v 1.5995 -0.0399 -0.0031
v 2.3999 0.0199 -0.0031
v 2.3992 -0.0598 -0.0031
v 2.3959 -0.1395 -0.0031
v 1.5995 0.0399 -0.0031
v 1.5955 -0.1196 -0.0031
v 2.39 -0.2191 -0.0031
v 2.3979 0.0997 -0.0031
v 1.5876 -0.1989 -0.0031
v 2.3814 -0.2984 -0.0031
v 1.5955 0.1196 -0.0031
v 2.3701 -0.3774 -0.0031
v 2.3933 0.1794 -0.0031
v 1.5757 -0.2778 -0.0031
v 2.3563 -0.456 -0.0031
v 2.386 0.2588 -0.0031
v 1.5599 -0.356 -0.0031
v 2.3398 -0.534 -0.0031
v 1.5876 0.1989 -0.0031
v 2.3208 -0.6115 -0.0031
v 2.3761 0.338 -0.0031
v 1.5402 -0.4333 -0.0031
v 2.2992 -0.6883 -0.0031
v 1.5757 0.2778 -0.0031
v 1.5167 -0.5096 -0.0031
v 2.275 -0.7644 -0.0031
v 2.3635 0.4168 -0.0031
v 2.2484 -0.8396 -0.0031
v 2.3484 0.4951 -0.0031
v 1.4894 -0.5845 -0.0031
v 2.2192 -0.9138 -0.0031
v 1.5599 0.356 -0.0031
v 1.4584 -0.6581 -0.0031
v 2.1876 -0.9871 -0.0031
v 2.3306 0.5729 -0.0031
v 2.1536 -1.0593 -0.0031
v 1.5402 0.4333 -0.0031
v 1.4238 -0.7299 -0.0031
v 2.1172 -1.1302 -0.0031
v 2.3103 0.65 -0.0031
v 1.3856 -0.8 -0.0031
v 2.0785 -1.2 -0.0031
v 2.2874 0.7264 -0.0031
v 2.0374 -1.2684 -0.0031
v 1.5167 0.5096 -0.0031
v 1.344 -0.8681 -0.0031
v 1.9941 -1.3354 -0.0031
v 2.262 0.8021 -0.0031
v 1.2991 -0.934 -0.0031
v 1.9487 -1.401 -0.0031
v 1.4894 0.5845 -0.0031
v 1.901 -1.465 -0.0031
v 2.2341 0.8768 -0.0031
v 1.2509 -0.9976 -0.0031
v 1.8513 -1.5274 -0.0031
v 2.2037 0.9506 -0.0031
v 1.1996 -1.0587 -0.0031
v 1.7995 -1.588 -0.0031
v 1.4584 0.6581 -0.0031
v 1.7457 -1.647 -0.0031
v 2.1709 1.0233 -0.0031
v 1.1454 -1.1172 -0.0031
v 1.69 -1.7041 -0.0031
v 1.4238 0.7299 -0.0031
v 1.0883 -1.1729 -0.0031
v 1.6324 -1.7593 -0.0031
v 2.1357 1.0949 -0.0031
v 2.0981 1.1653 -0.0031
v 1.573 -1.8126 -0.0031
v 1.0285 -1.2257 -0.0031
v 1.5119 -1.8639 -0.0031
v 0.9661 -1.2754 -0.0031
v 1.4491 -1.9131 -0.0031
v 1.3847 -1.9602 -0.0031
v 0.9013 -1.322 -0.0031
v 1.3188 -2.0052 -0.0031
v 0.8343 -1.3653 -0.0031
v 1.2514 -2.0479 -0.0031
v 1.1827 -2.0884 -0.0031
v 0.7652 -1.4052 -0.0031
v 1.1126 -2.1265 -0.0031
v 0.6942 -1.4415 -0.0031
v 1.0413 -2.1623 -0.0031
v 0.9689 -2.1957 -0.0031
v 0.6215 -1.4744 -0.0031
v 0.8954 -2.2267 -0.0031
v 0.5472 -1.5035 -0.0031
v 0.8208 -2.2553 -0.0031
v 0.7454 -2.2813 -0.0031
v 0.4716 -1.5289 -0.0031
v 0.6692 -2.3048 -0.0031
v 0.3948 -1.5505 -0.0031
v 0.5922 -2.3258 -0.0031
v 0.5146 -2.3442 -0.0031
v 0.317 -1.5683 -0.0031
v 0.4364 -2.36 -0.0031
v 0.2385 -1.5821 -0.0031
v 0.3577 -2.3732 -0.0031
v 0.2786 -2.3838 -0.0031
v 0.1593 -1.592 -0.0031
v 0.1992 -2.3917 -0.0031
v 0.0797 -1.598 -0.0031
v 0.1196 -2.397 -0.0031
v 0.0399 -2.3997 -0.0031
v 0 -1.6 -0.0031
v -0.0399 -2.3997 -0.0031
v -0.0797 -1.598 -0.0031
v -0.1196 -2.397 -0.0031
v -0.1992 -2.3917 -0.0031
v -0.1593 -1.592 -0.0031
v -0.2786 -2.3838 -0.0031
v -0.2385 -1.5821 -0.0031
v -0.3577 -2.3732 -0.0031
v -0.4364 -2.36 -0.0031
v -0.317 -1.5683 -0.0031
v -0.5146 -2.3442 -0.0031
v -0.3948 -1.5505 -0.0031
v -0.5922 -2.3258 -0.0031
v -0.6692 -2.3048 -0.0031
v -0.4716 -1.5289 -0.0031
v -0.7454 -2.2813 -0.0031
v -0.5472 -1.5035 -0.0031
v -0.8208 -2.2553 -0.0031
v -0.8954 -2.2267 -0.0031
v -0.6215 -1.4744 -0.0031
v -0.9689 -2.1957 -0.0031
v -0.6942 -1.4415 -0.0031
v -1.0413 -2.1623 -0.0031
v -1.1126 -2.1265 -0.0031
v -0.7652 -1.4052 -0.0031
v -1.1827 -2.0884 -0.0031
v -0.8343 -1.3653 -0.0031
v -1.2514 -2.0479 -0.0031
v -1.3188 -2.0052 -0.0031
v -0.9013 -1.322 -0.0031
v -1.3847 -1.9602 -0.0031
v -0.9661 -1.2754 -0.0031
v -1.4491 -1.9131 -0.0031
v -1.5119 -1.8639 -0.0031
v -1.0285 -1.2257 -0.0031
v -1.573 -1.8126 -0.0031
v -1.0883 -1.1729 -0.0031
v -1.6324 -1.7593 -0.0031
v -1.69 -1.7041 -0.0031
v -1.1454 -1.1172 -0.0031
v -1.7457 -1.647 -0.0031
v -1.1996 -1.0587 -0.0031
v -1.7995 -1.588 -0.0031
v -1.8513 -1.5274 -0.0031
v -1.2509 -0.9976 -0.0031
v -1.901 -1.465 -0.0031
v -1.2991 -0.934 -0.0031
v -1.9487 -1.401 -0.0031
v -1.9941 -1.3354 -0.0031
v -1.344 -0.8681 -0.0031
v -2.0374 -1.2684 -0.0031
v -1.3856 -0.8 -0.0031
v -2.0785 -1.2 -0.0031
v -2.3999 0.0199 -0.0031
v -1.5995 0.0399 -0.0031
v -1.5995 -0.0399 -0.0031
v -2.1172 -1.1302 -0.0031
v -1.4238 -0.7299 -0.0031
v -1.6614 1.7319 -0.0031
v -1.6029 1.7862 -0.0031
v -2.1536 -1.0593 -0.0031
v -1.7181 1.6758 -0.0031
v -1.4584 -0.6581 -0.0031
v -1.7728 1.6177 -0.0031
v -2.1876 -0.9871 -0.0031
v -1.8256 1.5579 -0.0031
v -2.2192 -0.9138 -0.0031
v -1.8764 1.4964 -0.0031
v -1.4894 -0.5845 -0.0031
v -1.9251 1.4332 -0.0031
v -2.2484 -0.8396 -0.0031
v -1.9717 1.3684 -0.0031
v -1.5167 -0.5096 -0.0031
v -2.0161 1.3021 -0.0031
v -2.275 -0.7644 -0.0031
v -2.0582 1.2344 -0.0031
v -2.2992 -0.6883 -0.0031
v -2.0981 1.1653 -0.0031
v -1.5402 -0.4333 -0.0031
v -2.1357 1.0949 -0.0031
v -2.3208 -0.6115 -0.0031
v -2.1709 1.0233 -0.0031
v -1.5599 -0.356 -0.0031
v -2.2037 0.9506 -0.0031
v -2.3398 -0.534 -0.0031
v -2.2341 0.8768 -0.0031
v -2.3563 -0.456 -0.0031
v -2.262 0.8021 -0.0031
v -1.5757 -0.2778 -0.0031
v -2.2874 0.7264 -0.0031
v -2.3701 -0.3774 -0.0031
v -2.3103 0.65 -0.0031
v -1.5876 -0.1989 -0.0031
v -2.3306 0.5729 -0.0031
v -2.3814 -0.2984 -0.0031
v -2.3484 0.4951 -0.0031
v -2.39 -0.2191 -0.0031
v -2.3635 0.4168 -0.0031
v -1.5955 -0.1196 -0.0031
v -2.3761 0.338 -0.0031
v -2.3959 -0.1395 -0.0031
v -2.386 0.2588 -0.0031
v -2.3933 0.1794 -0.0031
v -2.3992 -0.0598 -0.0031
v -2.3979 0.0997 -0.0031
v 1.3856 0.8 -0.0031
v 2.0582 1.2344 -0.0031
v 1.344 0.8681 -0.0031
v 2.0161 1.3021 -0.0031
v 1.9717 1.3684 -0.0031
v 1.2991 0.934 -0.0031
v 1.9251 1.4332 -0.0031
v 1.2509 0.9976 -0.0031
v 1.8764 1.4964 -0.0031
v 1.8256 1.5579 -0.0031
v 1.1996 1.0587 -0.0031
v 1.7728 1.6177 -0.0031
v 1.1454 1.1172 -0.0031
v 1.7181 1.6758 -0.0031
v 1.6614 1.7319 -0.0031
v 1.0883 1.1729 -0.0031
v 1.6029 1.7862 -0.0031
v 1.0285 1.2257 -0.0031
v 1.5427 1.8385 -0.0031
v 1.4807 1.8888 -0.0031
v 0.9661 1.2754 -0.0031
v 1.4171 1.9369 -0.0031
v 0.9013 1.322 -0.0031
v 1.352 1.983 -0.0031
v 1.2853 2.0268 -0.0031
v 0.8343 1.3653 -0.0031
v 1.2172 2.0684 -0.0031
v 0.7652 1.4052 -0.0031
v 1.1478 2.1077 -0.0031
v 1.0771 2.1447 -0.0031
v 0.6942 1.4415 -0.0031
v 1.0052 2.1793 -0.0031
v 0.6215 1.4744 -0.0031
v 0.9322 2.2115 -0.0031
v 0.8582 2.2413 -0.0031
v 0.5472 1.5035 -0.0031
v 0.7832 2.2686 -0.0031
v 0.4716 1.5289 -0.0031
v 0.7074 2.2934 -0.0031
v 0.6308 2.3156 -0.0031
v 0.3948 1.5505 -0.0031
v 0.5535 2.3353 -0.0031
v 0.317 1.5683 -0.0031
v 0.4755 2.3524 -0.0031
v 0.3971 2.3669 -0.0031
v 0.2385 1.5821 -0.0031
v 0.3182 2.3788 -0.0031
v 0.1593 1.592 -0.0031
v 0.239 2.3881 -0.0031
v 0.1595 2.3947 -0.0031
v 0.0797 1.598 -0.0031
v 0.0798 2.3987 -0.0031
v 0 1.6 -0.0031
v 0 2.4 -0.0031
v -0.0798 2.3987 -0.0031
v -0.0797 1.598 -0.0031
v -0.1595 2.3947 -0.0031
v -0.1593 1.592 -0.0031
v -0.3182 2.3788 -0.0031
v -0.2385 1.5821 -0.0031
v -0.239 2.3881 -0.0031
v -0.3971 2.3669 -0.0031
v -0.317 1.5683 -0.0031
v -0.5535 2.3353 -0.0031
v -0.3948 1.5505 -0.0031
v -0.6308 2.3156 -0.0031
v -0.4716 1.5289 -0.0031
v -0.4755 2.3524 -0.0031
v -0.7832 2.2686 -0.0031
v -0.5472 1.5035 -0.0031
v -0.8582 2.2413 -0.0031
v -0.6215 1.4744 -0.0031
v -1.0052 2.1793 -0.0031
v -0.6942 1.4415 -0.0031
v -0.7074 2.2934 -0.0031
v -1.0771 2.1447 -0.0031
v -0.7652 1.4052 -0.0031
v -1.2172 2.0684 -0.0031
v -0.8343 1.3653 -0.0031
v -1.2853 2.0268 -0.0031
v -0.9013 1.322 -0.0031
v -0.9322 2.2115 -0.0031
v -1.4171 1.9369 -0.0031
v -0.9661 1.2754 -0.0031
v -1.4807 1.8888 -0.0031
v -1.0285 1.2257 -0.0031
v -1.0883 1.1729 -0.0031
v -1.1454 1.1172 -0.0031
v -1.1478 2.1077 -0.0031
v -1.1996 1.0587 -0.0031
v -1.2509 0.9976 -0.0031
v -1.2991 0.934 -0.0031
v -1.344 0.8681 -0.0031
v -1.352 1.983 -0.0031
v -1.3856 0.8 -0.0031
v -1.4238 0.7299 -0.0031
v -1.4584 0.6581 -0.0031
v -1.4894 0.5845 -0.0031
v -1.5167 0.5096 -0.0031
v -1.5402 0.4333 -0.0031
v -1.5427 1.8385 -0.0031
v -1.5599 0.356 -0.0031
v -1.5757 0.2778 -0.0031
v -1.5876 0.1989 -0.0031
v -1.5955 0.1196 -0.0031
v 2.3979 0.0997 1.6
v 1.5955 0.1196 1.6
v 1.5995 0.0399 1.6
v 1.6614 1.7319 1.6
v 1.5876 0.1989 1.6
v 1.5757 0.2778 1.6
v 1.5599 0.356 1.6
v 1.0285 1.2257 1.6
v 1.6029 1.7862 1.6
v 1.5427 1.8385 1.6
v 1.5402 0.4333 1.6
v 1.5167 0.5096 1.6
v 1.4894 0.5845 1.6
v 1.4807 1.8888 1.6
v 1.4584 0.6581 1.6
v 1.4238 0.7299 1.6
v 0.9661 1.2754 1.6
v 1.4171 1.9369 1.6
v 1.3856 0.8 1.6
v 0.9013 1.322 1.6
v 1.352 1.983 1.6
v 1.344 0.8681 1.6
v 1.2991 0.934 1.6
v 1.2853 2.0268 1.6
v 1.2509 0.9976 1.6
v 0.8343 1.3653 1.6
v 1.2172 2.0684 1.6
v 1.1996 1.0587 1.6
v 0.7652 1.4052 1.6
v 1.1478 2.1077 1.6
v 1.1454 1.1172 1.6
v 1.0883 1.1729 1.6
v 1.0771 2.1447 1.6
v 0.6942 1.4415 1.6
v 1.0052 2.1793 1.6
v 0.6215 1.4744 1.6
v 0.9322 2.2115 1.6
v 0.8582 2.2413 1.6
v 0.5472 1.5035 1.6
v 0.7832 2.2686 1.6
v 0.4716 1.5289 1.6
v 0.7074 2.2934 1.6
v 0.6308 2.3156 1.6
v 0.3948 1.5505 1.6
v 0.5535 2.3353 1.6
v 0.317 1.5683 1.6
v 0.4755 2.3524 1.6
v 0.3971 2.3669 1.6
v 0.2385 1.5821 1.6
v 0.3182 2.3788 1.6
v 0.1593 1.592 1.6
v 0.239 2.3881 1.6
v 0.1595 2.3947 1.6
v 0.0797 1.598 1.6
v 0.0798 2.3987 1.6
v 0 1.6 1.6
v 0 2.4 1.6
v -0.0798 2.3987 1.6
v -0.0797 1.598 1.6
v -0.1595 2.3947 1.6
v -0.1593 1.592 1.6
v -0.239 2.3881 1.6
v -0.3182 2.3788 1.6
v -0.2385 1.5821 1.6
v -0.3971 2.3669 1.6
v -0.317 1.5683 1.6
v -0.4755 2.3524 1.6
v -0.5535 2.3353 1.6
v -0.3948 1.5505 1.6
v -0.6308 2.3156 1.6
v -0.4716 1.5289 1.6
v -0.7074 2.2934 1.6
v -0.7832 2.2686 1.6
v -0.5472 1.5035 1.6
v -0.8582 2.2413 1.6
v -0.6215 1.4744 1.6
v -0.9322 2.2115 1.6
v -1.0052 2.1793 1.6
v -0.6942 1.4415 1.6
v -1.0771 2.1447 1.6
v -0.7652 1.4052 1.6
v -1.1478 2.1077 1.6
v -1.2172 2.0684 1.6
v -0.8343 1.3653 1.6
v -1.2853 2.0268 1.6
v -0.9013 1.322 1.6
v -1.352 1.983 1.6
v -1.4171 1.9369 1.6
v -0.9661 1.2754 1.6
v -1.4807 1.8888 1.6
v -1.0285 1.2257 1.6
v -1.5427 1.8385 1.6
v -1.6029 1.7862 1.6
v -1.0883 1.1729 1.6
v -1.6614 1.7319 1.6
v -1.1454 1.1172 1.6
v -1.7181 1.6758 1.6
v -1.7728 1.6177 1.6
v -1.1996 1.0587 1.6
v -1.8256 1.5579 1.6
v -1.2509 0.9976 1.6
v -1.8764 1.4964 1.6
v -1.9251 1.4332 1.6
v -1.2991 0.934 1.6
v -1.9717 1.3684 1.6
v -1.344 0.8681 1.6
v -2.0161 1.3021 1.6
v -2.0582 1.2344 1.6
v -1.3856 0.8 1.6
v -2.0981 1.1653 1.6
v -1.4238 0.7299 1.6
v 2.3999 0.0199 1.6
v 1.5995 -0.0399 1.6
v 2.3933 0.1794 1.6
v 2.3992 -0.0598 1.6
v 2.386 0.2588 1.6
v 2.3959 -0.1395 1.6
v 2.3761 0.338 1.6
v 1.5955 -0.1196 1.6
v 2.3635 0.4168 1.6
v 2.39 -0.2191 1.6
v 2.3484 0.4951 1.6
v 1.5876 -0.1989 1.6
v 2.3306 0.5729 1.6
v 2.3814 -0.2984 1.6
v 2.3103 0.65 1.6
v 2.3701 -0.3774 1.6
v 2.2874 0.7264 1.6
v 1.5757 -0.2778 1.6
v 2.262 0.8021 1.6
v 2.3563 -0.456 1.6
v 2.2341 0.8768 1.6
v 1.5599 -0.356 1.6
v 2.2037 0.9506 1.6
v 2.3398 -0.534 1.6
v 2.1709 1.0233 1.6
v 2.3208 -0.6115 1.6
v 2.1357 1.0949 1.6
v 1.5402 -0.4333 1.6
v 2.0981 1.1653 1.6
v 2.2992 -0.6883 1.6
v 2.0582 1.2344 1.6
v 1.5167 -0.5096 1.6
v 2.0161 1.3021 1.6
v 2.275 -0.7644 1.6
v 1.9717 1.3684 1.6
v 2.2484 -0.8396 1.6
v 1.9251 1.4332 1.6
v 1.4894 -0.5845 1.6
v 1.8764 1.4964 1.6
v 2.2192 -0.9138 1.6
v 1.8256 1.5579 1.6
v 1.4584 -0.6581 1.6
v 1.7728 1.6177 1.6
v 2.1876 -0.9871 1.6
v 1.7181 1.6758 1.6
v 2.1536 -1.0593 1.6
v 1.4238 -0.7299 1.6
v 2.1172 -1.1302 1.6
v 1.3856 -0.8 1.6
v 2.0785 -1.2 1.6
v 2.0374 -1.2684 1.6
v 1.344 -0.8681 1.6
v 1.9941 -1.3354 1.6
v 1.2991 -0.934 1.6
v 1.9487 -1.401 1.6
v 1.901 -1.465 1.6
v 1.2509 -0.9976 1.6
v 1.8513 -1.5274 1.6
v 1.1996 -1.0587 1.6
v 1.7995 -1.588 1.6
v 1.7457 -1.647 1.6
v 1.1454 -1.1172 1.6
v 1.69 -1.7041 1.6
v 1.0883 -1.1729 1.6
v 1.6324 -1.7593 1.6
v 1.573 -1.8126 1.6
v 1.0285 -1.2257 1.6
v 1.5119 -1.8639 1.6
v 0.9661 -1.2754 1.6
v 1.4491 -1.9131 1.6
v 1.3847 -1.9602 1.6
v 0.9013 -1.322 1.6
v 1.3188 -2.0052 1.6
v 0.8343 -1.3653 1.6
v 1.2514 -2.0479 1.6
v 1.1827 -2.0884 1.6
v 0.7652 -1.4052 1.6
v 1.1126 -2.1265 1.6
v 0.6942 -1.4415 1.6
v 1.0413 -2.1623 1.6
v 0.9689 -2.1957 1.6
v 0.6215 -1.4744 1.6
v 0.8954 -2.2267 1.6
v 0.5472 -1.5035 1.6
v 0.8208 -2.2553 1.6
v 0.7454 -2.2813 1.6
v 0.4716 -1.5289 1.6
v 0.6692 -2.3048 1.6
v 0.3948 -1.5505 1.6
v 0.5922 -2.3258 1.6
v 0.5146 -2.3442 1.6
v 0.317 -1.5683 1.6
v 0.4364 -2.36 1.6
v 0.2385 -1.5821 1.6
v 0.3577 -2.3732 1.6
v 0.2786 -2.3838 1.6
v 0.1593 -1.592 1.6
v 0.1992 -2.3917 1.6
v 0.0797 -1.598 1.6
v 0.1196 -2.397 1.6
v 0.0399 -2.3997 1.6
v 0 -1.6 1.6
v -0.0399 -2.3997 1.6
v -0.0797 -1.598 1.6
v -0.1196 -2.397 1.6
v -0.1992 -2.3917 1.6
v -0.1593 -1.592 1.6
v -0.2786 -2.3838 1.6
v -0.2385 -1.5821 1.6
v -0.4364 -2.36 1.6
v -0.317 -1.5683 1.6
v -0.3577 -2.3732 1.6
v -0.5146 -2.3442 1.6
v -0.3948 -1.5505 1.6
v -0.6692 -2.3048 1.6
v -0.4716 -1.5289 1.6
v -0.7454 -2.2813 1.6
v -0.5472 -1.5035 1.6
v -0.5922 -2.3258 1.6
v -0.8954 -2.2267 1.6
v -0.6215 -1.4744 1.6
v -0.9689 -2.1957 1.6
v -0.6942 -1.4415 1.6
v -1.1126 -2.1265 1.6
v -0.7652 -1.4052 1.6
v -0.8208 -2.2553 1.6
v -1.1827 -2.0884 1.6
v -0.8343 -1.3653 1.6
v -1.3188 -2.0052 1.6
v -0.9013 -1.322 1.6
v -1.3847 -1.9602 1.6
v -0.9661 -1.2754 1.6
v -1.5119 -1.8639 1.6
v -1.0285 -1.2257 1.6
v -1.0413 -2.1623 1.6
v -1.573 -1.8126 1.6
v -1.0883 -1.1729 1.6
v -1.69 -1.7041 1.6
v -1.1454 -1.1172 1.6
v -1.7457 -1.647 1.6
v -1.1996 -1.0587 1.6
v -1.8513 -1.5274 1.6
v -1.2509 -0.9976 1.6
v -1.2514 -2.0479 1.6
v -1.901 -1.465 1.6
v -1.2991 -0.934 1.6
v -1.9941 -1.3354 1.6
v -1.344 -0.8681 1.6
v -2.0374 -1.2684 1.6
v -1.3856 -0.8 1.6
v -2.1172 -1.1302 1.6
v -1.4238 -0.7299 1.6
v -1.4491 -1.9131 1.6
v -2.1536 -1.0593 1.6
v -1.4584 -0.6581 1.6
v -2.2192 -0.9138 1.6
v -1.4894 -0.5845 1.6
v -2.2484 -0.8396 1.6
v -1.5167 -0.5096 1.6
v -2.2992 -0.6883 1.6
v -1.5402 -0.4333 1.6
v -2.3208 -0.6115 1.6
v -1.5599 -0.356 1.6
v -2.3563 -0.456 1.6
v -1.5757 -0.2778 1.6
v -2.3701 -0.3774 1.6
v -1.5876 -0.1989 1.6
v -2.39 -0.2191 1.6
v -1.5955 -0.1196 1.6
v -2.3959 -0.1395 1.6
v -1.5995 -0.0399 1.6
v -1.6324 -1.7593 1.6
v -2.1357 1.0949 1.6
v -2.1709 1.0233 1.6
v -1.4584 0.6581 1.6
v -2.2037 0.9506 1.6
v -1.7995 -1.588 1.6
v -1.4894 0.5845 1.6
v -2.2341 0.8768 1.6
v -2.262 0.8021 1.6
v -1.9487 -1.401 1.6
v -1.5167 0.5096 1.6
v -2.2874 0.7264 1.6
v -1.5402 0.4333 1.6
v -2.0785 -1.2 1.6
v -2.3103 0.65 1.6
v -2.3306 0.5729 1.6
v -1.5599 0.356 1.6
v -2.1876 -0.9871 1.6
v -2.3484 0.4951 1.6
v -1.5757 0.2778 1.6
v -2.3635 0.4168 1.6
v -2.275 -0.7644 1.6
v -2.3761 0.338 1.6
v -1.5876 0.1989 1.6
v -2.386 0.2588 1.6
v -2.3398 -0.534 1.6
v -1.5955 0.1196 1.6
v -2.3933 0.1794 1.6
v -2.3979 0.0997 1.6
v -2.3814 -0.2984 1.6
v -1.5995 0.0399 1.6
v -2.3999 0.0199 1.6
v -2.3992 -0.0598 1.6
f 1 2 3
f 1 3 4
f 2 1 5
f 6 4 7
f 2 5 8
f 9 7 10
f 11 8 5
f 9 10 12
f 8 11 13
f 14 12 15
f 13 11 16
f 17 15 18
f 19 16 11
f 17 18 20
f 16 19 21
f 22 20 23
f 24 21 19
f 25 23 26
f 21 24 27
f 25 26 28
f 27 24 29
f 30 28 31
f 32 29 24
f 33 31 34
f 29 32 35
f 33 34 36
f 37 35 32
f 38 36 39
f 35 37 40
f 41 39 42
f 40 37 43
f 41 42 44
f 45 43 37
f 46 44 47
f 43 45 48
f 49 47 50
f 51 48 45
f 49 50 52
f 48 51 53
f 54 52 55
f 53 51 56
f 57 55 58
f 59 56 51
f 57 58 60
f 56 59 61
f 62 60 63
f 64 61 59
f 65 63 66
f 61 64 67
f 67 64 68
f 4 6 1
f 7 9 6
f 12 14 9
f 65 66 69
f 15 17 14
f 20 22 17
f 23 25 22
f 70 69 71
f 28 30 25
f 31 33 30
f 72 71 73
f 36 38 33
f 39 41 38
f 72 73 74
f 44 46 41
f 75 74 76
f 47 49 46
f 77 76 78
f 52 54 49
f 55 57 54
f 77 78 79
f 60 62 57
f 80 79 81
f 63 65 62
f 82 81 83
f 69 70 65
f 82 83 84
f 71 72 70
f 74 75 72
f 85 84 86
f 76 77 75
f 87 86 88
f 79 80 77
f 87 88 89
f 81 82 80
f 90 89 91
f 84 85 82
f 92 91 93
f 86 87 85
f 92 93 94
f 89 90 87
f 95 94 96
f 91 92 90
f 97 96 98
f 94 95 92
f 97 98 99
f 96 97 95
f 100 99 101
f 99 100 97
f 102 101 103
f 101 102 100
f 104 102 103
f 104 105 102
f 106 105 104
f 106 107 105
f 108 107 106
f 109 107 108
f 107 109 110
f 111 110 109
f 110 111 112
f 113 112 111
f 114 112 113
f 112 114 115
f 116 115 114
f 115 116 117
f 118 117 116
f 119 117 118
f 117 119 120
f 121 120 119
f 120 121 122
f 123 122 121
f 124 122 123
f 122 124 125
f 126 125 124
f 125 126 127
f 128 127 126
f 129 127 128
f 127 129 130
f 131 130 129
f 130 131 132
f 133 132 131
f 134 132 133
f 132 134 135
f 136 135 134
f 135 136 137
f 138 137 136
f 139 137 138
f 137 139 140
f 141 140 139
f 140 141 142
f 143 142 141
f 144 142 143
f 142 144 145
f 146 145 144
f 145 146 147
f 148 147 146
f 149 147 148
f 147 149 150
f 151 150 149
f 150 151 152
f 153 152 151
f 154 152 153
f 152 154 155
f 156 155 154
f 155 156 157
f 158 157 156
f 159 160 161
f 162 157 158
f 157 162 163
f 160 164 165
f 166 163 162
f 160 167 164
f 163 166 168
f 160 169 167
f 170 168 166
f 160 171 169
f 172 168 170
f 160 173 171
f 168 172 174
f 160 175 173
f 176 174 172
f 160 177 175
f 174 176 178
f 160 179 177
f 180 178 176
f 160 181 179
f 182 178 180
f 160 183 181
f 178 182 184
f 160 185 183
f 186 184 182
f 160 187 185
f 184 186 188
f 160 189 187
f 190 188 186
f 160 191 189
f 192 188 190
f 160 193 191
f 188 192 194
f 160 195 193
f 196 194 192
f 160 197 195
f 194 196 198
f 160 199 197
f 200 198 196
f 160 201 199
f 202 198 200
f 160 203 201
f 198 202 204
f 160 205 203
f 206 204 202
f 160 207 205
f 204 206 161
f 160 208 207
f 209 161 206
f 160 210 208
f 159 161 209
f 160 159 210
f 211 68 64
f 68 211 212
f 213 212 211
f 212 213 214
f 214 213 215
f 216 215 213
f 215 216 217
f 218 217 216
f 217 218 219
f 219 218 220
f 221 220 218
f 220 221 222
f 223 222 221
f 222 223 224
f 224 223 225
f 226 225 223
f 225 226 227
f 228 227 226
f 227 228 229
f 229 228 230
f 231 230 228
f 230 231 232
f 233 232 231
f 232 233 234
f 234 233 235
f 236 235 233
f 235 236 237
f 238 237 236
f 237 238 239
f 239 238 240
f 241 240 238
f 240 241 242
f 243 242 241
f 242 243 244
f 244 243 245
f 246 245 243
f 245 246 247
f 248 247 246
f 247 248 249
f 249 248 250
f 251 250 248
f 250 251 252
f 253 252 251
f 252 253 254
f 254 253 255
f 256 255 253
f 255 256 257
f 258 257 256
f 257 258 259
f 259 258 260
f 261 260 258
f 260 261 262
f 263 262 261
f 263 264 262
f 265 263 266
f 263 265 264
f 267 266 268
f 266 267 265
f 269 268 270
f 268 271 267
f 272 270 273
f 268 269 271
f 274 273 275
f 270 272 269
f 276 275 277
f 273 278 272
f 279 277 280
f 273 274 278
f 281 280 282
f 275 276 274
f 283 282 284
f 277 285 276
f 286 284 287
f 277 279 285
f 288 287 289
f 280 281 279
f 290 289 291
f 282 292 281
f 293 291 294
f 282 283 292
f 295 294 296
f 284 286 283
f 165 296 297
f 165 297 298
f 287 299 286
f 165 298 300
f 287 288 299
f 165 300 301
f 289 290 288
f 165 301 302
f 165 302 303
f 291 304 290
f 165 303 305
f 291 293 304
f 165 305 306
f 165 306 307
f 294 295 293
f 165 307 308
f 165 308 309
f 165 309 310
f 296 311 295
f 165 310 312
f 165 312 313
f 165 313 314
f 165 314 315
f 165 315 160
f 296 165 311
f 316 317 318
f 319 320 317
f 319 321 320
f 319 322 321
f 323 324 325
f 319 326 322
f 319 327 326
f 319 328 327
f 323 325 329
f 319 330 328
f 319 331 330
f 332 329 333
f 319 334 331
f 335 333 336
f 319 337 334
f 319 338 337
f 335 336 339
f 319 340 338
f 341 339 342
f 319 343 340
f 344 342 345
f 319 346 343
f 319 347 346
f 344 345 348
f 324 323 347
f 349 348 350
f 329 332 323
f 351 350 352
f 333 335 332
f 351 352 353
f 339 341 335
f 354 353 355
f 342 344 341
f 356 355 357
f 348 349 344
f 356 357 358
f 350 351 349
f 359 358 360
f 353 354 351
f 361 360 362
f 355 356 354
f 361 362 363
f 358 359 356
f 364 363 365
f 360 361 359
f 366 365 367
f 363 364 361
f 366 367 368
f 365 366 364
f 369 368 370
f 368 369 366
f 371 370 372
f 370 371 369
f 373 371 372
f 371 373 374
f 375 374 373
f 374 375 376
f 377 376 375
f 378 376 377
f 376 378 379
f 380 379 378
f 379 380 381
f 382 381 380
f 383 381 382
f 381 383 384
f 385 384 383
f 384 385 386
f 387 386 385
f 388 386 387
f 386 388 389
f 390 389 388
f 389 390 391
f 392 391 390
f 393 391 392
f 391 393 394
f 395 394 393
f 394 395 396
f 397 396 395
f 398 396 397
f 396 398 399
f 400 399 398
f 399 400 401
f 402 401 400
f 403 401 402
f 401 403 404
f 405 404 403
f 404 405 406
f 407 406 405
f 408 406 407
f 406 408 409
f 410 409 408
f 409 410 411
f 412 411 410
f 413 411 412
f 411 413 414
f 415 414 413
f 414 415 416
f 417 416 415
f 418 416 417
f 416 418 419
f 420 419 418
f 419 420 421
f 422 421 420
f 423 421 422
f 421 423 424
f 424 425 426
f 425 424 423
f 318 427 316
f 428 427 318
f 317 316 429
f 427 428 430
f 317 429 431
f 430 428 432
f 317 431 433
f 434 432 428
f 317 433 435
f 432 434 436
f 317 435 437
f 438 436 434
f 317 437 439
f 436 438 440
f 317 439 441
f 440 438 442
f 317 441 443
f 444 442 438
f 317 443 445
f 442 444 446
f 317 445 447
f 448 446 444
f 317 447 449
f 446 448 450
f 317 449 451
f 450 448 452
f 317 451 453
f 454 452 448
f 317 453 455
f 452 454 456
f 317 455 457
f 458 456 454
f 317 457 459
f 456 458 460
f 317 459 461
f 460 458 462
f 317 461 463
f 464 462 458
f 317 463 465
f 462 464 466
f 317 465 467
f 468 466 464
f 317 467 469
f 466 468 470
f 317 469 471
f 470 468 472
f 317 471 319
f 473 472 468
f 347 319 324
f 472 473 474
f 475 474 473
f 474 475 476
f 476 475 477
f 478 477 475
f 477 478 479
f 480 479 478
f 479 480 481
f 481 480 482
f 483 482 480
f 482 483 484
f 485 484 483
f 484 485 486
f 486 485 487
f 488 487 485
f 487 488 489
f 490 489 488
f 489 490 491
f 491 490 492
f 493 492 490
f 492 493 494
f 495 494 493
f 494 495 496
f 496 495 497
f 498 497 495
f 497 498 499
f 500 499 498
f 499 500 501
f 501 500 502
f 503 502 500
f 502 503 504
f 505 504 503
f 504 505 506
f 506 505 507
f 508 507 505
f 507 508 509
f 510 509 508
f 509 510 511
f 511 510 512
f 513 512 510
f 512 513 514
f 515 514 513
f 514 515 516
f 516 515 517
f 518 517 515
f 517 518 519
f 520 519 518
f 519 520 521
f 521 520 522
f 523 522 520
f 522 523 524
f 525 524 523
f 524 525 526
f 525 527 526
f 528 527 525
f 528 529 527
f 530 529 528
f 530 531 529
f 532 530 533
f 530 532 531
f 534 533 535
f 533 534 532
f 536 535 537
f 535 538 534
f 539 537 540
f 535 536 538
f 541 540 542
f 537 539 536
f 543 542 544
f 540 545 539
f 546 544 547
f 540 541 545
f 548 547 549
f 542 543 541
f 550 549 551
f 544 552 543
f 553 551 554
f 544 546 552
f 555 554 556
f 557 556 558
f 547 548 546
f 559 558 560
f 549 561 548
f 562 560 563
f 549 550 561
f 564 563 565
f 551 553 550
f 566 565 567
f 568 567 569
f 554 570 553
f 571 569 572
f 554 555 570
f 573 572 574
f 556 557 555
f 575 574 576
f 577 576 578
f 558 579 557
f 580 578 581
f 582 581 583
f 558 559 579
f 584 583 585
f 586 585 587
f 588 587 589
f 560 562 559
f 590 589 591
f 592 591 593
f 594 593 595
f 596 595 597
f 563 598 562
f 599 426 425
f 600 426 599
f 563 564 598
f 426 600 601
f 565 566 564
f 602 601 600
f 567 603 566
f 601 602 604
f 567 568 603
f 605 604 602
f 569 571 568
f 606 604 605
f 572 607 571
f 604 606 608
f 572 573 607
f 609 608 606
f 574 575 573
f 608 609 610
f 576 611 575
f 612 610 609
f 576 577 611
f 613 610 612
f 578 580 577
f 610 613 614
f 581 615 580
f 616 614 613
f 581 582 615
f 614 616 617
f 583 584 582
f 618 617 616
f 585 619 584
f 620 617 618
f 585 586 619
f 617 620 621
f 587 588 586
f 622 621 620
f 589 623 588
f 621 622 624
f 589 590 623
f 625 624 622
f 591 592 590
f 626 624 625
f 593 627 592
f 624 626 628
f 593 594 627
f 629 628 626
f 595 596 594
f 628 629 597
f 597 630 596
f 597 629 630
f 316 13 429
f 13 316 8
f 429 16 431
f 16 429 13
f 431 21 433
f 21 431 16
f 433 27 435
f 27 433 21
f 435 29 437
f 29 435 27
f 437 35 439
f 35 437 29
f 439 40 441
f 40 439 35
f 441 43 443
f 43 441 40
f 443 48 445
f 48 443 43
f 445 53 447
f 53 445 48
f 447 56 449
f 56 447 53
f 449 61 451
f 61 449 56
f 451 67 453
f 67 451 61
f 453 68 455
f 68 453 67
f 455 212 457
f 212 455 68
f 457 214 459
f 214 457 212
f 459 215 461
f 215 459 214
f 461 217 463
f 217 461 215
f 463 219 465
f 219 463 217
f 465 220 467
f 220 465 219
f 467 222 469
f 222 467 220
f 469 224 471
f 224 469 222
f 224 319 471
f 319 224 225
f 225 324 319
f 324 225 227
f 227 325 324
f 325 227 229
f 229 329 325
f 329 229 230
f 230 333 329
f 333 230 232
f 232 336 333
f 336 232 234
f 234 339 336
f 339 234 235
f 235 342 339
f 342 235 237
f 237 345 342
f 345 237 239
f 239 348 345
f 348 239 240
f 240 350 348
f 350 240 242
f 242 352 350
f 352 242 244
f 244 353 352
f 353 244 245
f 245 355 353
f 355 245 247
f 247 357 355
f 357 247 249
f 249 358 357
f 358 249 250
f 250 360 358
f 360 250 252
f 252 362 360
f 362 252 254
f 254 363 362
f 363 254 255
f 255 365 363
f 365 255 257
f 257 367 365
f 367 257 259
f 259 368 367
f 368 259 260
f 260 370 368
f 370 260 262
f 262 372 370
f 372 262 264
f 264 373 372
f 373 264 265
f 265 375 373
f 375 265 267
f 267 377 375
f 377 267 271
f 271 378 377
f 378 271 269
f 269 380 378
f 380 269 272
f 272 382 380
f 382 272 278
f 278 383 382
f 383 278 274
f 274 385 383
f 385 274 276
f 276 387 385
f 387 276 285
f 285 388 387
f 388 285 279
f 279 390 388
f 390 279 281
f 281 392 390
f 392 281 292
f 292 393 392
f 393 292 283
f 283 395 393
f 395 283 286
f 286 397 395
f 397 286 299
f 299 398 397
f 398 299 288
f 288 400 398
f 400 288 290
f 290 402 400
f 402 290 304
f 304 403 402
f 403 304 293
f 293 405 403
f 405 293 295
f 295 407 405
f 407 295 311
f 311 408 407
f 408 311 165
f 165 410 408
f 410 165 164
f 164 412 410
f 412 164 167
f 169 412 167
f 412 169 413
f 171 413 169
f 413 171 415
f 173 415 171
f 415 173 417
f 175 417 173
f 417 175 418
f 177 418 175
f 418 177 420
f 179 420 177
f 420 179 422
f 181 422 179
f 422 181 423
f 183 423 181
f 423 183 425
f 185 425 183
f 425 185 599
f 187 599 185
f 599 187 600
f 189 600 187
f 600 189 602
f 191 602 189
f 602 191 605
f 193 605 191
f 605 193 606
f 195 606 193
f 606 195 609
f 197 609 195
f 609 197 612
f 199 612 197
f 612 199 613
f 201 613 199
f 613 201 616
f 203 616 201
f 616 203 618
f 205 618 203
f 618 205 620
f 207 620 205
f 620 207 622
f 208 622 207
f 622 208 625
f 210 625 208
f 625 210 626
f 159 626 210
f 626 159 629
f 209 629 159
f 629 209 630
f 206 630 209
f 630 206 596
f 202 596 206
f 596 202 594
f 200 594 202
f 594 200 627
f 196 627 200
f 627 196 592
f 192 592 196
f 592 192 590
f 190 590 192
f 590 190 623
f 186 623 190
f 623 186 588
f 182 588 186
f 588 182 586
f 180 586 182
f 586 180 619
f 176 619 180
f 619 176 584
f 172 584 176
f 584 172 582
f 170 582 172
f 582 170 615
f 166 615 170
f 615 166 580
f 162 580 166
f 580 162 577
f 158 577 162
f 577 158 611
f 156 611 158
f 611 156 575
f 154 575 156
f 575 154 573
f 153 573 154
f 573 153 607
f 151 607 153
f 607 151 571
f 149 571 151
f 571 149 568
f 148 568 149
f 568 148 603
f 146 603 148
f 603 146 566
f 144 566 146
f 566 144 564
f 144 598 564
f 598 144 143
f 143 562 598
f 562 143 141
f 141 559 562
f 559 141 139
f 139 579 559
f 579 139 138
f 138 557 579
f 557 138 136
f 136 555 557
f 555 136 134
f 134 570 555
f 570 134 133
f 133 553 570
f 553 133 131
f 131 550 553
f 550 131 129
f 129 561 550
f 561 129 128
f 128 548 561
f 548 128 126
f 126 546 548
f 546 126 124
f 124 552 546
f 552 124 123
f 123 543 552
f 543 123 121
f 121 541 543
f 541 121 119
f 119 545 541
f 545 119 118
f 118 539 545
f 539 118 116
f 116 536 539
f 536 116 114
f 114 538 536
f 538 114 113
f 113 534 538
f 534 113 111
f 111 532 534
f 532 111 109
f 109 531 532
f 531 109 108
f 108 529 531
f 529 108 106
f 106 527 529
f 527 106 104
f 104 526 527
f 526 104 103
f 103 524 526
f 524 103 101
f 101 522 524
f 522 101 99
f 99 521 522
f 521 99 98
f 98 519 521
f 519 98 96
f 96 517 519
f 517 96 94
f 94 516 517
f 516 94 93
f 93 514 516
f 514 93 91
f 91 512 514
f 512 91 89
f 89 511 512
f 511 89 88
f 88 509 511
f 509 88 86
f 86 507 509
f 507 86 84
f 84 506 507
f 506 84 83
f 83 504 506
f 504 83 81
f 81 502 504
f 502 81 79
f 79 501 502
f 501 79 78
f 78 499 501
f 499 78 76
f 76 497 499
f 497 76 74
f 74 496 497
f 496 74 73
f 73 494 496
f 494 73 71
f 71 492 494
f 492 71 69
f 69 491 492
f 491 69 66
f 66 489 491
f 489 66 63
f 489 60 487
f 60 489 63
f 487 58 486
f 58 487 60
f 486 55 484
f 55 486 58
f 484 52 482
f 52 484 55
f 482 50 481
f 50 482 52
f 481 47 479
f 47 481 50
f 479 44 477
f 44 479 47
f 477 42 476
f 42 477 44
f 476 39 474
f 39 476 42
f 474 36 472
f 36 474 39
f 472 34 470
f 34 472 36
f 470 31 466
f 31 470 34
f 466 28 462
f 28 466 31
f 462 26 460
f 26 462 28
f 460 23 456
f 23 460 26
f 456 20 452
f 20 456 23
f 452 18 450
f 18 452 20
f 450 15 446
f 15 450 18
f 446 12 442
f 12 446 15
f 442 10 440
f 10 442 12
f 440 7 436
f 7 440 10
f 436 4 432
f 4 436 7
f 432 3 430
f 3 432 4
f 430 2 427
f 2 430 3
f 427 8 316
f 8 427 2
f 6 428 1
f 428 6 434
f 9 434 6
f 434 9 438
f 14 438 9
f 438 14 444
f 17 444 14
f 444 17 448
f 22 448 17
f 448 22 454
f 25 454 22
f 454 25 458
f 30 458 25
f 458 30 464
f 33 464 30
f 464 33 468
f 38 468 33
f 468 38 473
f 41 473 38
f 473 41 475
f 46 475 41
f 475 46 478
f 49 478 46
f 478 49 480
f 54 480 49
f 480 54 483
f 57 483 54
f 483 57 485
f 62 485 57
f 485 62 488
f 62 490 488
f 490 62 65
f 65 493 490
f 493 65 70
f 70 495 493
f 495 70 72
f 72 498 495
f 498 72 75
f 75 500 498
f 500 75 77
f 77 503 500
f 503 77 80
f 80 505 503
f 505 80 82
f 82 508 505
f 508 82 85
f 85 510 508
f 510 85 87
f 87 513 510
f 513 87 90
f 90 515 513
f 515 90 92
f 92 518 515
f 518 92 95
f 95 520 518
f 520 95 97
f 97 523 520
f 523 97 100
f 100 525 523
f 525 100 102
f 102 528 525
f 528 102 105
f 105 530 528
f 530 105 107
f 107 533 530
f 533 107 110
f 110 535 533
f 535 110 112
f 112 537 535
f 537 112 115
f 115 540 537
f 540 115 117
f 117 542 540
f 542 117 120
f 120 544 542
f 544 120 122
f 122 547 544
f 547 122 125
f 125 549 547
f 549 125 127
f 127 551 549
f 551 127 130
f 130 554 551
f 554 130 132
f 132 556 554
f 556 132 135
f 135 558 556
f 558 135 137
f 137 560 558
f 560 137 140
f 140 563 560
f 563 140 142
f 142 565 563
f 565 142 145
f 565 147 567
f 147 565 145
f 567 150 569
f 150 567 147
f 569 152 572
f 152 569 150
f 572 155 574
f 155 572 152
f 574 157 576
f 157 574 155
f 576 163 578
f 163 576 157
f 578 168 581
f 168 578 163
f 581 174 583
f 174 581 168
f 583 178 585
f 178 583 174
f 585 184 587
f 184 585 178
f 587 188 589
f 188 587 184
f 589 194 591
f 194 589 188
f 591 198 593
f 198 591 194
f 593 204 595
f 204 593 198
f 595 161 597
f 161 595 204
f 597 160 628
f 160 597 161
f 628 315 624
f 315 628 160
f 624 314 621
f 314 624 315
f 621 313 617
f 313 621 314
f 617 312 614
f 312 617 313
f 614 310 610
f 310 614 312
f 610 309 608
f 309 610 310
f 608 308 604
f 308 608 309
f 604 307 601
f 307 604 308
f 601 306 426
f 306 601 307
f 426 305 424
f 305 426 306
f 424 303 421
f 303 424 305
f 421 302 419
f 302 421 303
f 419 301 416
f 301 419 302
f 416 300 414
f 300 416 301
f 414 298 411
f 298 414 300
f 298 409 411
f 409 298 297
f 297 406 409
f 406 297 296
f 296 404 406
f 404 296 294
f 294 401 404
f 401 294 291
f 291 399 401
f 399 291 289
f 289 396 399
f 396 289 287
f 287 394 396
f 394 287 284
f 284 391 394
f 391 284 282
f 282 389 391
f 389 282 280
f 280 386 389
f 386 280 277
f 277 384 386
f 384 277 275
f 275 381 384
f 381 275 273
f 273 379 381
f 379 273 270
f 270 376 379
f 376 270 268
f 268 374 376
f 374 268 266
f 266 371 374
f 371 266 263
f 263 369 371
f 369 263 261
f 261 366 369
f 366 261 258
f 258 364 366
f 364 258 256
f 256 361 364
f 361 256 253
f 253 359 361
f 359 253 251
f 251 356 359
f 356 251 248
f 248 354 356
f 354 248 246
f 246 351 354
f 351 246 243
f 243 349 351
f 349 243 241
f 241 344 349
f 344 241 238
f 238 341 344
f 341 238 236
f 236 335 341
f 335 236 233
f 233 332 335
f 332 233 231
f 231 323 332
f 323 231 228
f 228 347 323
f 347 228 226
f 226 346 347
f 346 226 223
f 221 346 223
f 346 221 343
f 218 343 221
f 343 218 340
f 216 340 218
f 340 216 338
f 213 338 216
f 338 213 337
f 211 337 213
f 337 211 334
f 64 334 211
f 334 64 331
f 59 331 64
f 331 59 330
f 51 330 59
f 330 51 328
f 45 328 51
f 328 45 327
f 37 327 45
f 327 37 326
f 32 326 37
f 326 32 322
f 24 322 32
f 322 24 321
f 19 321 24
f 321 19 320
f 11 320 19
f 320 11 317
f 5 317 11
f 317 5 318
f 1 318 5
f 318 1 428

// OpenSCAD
use <../lib.scad>
use <s/92262ph1s01.scad>
use <../p/stud2.scad>
$fa=1; $fs=0.2;
function ldraw_lib__92263ph1(realsolid=false) = [
// 0 Door  1 x  3 x  2 Right with Hollow Hinge with Horizontal White Line Pattern
// 0 Name: 92263ph1.dat
// 0 Author: Philip van Heemstra [BrickBaron]
// 0 !LDRAW_ORG Part UPDATE 2022-01
// 0 !LICENSE Licensed under CC BY 2.0 and CC BY 4.0 : see CAreadme.txt
// 
// 0 BFC CERTIFY CCW
  [0,"BFC","CERTIFY"],
  [0,"BFC","CCW"],
// 
// 0 !KEYWORDS Bricklink 92263pb004, Harry Potter, Set 75953, Set 75968
// 
// 0 !HISTORY 2022-01-14 [PTadmin] Official Update 2022-01
// 
// 
// 1 16 0 0 0 -1 0 0 0 1 0 0 0 1 s\92262ph1s01.dat
  [1,16,0,0,0,-1,0,0,0,1,0,0,0,1, ldraw_lib__s__92262ph1s01(realsolid)],
// 1 16 0 0 0 -1 0 0 0 1 0 0 0 -1 stud2.dat
  [1,16,0,0,0,-1,0,0,0,1,0,0,0,-1, ldraw_lib__stud2(realsolid)],
];
module ldraw_lib__92263ph1(step=0, col=false, unit=2/5, alt=false, line=0.2, solid=!$preview)
    makepoly(ldraw_lib__92263ph1(solid), step=step, col=col, unit=unit, alt=alt, line=line, solid=solid);
ldraw_lib__92263ph1(line=0.2);
